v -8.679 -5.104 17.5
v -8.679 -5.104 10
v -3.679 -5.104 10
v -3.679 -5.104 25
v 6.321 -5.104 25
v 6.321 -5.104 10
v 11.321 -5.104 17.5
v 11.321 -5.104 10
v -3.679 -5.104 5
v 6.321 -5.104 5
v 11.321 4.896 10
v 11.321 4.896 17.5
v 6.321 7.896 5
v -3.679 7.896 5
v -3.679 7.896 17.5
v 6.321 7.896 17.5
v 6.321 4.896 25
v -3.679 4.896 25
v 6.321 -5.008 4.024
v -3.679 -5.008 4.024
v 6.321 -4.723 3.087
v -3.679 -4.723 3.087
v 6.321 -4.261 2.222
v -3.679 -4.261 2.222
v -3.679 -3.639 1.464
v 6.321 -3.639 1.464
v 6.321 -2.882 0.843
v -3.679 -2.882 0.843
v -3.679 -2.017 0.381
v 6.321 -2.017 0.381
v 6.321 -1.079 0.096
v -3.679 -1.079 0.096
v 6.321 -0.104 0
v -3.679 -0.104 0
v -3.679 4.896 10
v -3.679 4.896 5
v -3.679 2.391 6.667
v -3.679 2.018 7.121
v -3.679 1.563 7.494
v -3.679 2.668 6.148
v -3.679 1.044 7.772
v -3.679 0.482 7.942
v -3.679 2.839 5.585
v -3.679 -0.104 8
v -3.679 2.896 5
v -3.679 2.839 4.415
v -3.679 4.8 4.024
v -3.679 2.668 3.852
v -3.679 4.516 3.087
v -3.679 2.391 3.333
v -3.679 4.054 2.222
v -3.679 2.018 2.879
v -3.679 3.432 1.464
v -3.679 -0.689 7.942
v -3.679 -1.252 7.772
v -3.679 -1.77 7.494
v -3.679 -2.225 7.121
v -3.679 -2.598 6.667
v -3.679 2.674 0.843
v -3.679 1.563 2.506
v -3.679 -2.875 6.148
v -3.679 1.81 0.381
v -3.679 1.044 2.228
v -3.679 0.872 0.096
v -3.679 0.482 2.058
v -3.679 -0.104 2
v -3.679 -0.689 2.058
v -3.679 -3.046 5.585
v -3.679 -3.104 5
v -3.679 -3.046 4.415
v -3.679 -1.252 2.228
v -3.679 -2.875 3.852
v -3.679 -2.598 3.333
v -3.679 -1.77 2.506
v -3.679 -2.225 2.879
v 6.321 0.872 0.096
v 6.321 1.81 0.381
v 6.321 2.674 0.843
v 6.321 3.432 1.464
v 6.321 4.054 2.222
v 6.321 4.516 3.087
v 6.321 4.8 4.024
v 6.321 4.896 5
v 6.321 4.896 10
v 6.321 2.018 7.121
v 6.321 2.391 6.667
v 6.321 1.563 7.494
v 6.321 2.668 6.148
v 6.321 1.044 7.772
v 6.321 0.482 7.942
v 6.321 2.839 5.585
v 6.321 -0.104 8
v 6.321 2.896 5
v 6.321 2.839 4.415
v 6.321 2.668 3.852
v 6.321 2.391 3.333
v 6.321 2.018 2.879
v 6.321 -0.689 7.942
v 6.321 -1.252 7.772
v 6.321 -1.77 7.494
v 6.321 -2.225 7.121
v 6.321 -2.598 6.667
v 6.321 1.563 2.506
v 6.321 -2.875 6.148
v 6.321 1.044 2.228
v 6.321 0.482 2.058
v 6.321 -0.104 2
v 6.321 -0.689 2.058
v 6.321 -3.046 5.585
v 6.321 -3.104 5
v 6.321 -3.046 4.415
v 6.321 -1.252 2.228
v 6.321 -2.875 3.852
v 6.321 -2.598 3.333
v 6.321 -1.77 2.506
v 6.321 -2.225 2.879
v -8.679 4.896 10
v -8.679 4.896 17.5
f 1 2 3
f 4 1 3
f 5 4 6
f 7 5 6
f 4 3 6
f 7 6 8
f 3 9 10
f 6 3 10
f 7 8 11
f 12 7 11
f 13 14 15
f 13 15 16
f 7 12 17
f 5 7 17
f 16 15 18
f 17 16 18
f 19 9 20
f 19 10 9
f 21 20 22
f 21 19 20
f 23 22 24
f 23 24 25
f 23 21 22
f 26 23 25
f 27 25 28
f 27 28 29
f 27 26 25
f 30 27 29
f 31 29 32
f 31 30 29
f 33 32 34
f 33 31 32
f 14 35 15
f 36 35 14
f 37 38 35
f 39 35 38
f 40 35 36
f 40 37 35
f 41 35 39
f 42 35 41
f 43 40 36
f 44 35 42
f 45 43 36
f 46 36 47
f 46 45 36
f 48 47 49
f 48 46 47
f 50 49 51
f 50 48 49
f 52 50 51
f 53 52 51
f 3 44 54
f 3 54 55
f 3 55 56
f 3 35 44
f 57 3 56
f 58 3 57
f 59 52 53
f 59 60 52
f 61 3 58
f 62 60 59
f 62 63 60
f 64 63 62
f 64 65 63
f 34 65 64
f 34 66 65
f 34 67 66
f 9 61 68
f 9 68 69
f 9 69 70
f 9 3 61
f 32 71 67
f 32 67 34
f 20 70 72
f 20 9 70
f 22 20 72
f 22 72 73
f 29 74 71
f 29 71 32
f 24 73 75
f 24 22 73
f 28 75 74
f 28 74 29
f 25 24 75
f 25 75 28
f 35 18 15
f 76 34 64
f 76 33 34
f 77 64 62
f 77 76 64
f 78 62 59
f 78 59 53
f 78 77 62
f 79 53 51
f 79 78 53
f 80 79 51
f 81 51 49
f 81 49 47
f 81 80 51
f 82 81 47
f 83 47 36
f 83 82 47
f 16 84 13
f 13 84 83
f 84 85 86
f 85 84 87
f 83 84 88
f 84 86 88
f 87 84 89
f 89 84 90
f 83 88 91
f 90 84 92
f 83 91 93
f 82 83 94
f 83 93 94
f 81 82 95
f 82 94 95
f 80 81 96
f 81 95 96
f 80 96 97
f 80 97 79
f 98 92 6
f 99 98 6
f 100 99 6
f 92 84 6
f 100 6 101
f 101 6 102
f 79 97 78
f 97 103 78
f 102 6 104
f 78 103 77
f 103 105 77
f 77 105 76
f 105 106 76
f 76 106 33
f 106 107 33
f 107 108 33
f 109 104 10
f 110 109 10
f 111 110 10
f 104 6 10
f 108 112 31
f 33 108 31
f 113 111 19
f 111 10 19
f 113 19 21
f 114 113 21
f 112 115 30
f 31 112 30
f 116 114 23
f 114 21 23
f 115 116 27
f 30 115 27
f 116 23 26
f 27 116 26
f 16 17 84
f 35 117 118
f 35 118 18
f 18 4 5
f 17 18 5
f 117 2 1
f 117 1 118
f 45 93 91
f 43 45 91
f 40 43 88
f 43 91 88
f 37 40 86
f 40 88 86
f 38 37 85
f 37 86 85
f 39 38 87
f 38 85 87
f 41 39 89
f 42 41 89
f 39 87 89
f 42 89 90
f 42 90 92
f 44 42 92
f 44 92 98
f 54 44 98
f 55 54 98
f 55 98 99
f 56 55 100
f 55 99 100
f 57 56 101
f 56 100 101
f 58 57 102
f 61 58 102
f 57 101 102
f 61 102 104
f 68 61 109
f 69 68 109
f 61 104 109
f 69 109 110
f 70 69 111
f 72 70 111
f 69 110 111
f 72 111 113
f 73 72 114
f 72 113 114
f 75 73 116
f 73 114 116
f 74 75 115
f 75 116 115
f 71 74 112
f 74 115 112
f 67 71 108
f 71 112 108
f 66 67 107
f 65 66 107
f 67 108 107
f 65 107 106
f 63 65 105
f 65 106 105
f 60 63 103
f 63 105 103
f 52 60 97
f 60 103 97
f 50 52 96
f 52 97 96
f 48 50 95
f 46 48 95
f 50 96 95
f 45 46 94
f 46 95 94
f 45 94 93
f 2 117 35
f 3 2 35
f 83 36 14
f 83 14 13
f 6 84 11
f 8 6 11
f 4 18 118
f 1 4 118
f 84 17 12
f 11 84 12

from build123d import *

# Parameters (mm, degrees)
SKETCH1_W           = 10
SKETCH1_H           = 10
BOSS_EXTRUDE1_DEPTH = 10
SKETCH2_R           = 3
CUT_EXTRUDE1_DEPTH  = 10
FILLET2_R           = 5
SKETCH3_W           = 20
SKETCH3_H           = 10
BOSS_EXTRUDE3_DEPTH = 15
CUT_EXTRUDE2_DEPTH  = 15
SKETCH5_W           = 10
SKETCH5_H           = 20
BOSS_EXTRUDE4_DEPTH = 3
CUT_EXTRUDE3_DEPTH  = 10


with BuildPart() as part:
    # Sketch1 → Boss-Extrude1 (new body)
    with BuildSketch(Plane.XY):
        with Locations((1.321243523, -0.103626943)):
            Rectangle(SKETCH1_W, SKETCH1_H)
    extrude(amount=BOSS_EXTRUDE1_DEPTH)

    # Sketch2 → Cut-Extrude1 (cut)
    with BuildSketch(Plane(origin=(6.321243523, 0, 0), x_dir=(0, 0, -1), z_dir=(1, 0, 0))):
        with Locations(Location((-5, -0.103626943, 0), (0, 0, 90))):
            Circle(SKETCH2_R)
    extrude(amount=-CUT_EXTRUDE1_DEPTH, mode=Mode.SUBTRACT)

    # Fillet2
    fillet2_edges = [part.edges().sort_by_distance(p)[0] for p in [
        (1.321243523, -5.103626943, 0),
        (1.321243523, 4.896373057, 0),
    ]]
    fillet(fillet2_edges, radius=FILLET2_R - 0.0001)  # a hair under: the kernel refuses the full size

    # Sketch3 → Boss-Extrude3 (add)
    with BuildSketch(Plane.XY.offset(10)):
        with Locations((1.321243523, -0.103626943)):
            Rectangle(SKETCH3_W, SKETCH3_H)
    extrude(amount=BOSS_EXTRUDE3_DEPTH)

    # Sketch4 → Cut-Extrude2 (cut)
    with BuildSketch(Plane(origin=(0, 4.896373057, 0), x_dir=(1, 0, 0), z_dir=(0, 1, 0))):
        Polygon((11.321243523, -17.5), (6.321243523, -25), (11.321243523, -25), align=None)
        Polygon((-8.678756477, -25), (-3.678756477, -25), (-8.678756477, -17.5), align=None)
    extrude(amount=-CUT_EXTRUDE2_DEPTH, mode=Mode.SUBTRACT)

    # Sketch5 → Boss-Extrude4 (add)
    with BuildSketch(Plane(origin=(0, 4.896373057, 0), x_dir=(1, 0, 0), z_dir=(0, 1, 0))):
        with Locations((1.321243523, -15)):
            Rectangle(SKETCH5_W, SKETCH5_H)
    extrude(amount=BOSS_EXTRUDE4_DEPTH)

    # Sketch6 → Cut-Extrude3 (cut)
    with BuildSketch(Plane.ZY.offset(3.678756477)):
        Polygon((17.5, 7.896373057), (25, 4.896373057), (25, 7.896373057), align=None)
    extrude(amount=-CUT_EXTRUDE3_DEPTH, mode=Mode.SUBTRACT)


solid = part.part
